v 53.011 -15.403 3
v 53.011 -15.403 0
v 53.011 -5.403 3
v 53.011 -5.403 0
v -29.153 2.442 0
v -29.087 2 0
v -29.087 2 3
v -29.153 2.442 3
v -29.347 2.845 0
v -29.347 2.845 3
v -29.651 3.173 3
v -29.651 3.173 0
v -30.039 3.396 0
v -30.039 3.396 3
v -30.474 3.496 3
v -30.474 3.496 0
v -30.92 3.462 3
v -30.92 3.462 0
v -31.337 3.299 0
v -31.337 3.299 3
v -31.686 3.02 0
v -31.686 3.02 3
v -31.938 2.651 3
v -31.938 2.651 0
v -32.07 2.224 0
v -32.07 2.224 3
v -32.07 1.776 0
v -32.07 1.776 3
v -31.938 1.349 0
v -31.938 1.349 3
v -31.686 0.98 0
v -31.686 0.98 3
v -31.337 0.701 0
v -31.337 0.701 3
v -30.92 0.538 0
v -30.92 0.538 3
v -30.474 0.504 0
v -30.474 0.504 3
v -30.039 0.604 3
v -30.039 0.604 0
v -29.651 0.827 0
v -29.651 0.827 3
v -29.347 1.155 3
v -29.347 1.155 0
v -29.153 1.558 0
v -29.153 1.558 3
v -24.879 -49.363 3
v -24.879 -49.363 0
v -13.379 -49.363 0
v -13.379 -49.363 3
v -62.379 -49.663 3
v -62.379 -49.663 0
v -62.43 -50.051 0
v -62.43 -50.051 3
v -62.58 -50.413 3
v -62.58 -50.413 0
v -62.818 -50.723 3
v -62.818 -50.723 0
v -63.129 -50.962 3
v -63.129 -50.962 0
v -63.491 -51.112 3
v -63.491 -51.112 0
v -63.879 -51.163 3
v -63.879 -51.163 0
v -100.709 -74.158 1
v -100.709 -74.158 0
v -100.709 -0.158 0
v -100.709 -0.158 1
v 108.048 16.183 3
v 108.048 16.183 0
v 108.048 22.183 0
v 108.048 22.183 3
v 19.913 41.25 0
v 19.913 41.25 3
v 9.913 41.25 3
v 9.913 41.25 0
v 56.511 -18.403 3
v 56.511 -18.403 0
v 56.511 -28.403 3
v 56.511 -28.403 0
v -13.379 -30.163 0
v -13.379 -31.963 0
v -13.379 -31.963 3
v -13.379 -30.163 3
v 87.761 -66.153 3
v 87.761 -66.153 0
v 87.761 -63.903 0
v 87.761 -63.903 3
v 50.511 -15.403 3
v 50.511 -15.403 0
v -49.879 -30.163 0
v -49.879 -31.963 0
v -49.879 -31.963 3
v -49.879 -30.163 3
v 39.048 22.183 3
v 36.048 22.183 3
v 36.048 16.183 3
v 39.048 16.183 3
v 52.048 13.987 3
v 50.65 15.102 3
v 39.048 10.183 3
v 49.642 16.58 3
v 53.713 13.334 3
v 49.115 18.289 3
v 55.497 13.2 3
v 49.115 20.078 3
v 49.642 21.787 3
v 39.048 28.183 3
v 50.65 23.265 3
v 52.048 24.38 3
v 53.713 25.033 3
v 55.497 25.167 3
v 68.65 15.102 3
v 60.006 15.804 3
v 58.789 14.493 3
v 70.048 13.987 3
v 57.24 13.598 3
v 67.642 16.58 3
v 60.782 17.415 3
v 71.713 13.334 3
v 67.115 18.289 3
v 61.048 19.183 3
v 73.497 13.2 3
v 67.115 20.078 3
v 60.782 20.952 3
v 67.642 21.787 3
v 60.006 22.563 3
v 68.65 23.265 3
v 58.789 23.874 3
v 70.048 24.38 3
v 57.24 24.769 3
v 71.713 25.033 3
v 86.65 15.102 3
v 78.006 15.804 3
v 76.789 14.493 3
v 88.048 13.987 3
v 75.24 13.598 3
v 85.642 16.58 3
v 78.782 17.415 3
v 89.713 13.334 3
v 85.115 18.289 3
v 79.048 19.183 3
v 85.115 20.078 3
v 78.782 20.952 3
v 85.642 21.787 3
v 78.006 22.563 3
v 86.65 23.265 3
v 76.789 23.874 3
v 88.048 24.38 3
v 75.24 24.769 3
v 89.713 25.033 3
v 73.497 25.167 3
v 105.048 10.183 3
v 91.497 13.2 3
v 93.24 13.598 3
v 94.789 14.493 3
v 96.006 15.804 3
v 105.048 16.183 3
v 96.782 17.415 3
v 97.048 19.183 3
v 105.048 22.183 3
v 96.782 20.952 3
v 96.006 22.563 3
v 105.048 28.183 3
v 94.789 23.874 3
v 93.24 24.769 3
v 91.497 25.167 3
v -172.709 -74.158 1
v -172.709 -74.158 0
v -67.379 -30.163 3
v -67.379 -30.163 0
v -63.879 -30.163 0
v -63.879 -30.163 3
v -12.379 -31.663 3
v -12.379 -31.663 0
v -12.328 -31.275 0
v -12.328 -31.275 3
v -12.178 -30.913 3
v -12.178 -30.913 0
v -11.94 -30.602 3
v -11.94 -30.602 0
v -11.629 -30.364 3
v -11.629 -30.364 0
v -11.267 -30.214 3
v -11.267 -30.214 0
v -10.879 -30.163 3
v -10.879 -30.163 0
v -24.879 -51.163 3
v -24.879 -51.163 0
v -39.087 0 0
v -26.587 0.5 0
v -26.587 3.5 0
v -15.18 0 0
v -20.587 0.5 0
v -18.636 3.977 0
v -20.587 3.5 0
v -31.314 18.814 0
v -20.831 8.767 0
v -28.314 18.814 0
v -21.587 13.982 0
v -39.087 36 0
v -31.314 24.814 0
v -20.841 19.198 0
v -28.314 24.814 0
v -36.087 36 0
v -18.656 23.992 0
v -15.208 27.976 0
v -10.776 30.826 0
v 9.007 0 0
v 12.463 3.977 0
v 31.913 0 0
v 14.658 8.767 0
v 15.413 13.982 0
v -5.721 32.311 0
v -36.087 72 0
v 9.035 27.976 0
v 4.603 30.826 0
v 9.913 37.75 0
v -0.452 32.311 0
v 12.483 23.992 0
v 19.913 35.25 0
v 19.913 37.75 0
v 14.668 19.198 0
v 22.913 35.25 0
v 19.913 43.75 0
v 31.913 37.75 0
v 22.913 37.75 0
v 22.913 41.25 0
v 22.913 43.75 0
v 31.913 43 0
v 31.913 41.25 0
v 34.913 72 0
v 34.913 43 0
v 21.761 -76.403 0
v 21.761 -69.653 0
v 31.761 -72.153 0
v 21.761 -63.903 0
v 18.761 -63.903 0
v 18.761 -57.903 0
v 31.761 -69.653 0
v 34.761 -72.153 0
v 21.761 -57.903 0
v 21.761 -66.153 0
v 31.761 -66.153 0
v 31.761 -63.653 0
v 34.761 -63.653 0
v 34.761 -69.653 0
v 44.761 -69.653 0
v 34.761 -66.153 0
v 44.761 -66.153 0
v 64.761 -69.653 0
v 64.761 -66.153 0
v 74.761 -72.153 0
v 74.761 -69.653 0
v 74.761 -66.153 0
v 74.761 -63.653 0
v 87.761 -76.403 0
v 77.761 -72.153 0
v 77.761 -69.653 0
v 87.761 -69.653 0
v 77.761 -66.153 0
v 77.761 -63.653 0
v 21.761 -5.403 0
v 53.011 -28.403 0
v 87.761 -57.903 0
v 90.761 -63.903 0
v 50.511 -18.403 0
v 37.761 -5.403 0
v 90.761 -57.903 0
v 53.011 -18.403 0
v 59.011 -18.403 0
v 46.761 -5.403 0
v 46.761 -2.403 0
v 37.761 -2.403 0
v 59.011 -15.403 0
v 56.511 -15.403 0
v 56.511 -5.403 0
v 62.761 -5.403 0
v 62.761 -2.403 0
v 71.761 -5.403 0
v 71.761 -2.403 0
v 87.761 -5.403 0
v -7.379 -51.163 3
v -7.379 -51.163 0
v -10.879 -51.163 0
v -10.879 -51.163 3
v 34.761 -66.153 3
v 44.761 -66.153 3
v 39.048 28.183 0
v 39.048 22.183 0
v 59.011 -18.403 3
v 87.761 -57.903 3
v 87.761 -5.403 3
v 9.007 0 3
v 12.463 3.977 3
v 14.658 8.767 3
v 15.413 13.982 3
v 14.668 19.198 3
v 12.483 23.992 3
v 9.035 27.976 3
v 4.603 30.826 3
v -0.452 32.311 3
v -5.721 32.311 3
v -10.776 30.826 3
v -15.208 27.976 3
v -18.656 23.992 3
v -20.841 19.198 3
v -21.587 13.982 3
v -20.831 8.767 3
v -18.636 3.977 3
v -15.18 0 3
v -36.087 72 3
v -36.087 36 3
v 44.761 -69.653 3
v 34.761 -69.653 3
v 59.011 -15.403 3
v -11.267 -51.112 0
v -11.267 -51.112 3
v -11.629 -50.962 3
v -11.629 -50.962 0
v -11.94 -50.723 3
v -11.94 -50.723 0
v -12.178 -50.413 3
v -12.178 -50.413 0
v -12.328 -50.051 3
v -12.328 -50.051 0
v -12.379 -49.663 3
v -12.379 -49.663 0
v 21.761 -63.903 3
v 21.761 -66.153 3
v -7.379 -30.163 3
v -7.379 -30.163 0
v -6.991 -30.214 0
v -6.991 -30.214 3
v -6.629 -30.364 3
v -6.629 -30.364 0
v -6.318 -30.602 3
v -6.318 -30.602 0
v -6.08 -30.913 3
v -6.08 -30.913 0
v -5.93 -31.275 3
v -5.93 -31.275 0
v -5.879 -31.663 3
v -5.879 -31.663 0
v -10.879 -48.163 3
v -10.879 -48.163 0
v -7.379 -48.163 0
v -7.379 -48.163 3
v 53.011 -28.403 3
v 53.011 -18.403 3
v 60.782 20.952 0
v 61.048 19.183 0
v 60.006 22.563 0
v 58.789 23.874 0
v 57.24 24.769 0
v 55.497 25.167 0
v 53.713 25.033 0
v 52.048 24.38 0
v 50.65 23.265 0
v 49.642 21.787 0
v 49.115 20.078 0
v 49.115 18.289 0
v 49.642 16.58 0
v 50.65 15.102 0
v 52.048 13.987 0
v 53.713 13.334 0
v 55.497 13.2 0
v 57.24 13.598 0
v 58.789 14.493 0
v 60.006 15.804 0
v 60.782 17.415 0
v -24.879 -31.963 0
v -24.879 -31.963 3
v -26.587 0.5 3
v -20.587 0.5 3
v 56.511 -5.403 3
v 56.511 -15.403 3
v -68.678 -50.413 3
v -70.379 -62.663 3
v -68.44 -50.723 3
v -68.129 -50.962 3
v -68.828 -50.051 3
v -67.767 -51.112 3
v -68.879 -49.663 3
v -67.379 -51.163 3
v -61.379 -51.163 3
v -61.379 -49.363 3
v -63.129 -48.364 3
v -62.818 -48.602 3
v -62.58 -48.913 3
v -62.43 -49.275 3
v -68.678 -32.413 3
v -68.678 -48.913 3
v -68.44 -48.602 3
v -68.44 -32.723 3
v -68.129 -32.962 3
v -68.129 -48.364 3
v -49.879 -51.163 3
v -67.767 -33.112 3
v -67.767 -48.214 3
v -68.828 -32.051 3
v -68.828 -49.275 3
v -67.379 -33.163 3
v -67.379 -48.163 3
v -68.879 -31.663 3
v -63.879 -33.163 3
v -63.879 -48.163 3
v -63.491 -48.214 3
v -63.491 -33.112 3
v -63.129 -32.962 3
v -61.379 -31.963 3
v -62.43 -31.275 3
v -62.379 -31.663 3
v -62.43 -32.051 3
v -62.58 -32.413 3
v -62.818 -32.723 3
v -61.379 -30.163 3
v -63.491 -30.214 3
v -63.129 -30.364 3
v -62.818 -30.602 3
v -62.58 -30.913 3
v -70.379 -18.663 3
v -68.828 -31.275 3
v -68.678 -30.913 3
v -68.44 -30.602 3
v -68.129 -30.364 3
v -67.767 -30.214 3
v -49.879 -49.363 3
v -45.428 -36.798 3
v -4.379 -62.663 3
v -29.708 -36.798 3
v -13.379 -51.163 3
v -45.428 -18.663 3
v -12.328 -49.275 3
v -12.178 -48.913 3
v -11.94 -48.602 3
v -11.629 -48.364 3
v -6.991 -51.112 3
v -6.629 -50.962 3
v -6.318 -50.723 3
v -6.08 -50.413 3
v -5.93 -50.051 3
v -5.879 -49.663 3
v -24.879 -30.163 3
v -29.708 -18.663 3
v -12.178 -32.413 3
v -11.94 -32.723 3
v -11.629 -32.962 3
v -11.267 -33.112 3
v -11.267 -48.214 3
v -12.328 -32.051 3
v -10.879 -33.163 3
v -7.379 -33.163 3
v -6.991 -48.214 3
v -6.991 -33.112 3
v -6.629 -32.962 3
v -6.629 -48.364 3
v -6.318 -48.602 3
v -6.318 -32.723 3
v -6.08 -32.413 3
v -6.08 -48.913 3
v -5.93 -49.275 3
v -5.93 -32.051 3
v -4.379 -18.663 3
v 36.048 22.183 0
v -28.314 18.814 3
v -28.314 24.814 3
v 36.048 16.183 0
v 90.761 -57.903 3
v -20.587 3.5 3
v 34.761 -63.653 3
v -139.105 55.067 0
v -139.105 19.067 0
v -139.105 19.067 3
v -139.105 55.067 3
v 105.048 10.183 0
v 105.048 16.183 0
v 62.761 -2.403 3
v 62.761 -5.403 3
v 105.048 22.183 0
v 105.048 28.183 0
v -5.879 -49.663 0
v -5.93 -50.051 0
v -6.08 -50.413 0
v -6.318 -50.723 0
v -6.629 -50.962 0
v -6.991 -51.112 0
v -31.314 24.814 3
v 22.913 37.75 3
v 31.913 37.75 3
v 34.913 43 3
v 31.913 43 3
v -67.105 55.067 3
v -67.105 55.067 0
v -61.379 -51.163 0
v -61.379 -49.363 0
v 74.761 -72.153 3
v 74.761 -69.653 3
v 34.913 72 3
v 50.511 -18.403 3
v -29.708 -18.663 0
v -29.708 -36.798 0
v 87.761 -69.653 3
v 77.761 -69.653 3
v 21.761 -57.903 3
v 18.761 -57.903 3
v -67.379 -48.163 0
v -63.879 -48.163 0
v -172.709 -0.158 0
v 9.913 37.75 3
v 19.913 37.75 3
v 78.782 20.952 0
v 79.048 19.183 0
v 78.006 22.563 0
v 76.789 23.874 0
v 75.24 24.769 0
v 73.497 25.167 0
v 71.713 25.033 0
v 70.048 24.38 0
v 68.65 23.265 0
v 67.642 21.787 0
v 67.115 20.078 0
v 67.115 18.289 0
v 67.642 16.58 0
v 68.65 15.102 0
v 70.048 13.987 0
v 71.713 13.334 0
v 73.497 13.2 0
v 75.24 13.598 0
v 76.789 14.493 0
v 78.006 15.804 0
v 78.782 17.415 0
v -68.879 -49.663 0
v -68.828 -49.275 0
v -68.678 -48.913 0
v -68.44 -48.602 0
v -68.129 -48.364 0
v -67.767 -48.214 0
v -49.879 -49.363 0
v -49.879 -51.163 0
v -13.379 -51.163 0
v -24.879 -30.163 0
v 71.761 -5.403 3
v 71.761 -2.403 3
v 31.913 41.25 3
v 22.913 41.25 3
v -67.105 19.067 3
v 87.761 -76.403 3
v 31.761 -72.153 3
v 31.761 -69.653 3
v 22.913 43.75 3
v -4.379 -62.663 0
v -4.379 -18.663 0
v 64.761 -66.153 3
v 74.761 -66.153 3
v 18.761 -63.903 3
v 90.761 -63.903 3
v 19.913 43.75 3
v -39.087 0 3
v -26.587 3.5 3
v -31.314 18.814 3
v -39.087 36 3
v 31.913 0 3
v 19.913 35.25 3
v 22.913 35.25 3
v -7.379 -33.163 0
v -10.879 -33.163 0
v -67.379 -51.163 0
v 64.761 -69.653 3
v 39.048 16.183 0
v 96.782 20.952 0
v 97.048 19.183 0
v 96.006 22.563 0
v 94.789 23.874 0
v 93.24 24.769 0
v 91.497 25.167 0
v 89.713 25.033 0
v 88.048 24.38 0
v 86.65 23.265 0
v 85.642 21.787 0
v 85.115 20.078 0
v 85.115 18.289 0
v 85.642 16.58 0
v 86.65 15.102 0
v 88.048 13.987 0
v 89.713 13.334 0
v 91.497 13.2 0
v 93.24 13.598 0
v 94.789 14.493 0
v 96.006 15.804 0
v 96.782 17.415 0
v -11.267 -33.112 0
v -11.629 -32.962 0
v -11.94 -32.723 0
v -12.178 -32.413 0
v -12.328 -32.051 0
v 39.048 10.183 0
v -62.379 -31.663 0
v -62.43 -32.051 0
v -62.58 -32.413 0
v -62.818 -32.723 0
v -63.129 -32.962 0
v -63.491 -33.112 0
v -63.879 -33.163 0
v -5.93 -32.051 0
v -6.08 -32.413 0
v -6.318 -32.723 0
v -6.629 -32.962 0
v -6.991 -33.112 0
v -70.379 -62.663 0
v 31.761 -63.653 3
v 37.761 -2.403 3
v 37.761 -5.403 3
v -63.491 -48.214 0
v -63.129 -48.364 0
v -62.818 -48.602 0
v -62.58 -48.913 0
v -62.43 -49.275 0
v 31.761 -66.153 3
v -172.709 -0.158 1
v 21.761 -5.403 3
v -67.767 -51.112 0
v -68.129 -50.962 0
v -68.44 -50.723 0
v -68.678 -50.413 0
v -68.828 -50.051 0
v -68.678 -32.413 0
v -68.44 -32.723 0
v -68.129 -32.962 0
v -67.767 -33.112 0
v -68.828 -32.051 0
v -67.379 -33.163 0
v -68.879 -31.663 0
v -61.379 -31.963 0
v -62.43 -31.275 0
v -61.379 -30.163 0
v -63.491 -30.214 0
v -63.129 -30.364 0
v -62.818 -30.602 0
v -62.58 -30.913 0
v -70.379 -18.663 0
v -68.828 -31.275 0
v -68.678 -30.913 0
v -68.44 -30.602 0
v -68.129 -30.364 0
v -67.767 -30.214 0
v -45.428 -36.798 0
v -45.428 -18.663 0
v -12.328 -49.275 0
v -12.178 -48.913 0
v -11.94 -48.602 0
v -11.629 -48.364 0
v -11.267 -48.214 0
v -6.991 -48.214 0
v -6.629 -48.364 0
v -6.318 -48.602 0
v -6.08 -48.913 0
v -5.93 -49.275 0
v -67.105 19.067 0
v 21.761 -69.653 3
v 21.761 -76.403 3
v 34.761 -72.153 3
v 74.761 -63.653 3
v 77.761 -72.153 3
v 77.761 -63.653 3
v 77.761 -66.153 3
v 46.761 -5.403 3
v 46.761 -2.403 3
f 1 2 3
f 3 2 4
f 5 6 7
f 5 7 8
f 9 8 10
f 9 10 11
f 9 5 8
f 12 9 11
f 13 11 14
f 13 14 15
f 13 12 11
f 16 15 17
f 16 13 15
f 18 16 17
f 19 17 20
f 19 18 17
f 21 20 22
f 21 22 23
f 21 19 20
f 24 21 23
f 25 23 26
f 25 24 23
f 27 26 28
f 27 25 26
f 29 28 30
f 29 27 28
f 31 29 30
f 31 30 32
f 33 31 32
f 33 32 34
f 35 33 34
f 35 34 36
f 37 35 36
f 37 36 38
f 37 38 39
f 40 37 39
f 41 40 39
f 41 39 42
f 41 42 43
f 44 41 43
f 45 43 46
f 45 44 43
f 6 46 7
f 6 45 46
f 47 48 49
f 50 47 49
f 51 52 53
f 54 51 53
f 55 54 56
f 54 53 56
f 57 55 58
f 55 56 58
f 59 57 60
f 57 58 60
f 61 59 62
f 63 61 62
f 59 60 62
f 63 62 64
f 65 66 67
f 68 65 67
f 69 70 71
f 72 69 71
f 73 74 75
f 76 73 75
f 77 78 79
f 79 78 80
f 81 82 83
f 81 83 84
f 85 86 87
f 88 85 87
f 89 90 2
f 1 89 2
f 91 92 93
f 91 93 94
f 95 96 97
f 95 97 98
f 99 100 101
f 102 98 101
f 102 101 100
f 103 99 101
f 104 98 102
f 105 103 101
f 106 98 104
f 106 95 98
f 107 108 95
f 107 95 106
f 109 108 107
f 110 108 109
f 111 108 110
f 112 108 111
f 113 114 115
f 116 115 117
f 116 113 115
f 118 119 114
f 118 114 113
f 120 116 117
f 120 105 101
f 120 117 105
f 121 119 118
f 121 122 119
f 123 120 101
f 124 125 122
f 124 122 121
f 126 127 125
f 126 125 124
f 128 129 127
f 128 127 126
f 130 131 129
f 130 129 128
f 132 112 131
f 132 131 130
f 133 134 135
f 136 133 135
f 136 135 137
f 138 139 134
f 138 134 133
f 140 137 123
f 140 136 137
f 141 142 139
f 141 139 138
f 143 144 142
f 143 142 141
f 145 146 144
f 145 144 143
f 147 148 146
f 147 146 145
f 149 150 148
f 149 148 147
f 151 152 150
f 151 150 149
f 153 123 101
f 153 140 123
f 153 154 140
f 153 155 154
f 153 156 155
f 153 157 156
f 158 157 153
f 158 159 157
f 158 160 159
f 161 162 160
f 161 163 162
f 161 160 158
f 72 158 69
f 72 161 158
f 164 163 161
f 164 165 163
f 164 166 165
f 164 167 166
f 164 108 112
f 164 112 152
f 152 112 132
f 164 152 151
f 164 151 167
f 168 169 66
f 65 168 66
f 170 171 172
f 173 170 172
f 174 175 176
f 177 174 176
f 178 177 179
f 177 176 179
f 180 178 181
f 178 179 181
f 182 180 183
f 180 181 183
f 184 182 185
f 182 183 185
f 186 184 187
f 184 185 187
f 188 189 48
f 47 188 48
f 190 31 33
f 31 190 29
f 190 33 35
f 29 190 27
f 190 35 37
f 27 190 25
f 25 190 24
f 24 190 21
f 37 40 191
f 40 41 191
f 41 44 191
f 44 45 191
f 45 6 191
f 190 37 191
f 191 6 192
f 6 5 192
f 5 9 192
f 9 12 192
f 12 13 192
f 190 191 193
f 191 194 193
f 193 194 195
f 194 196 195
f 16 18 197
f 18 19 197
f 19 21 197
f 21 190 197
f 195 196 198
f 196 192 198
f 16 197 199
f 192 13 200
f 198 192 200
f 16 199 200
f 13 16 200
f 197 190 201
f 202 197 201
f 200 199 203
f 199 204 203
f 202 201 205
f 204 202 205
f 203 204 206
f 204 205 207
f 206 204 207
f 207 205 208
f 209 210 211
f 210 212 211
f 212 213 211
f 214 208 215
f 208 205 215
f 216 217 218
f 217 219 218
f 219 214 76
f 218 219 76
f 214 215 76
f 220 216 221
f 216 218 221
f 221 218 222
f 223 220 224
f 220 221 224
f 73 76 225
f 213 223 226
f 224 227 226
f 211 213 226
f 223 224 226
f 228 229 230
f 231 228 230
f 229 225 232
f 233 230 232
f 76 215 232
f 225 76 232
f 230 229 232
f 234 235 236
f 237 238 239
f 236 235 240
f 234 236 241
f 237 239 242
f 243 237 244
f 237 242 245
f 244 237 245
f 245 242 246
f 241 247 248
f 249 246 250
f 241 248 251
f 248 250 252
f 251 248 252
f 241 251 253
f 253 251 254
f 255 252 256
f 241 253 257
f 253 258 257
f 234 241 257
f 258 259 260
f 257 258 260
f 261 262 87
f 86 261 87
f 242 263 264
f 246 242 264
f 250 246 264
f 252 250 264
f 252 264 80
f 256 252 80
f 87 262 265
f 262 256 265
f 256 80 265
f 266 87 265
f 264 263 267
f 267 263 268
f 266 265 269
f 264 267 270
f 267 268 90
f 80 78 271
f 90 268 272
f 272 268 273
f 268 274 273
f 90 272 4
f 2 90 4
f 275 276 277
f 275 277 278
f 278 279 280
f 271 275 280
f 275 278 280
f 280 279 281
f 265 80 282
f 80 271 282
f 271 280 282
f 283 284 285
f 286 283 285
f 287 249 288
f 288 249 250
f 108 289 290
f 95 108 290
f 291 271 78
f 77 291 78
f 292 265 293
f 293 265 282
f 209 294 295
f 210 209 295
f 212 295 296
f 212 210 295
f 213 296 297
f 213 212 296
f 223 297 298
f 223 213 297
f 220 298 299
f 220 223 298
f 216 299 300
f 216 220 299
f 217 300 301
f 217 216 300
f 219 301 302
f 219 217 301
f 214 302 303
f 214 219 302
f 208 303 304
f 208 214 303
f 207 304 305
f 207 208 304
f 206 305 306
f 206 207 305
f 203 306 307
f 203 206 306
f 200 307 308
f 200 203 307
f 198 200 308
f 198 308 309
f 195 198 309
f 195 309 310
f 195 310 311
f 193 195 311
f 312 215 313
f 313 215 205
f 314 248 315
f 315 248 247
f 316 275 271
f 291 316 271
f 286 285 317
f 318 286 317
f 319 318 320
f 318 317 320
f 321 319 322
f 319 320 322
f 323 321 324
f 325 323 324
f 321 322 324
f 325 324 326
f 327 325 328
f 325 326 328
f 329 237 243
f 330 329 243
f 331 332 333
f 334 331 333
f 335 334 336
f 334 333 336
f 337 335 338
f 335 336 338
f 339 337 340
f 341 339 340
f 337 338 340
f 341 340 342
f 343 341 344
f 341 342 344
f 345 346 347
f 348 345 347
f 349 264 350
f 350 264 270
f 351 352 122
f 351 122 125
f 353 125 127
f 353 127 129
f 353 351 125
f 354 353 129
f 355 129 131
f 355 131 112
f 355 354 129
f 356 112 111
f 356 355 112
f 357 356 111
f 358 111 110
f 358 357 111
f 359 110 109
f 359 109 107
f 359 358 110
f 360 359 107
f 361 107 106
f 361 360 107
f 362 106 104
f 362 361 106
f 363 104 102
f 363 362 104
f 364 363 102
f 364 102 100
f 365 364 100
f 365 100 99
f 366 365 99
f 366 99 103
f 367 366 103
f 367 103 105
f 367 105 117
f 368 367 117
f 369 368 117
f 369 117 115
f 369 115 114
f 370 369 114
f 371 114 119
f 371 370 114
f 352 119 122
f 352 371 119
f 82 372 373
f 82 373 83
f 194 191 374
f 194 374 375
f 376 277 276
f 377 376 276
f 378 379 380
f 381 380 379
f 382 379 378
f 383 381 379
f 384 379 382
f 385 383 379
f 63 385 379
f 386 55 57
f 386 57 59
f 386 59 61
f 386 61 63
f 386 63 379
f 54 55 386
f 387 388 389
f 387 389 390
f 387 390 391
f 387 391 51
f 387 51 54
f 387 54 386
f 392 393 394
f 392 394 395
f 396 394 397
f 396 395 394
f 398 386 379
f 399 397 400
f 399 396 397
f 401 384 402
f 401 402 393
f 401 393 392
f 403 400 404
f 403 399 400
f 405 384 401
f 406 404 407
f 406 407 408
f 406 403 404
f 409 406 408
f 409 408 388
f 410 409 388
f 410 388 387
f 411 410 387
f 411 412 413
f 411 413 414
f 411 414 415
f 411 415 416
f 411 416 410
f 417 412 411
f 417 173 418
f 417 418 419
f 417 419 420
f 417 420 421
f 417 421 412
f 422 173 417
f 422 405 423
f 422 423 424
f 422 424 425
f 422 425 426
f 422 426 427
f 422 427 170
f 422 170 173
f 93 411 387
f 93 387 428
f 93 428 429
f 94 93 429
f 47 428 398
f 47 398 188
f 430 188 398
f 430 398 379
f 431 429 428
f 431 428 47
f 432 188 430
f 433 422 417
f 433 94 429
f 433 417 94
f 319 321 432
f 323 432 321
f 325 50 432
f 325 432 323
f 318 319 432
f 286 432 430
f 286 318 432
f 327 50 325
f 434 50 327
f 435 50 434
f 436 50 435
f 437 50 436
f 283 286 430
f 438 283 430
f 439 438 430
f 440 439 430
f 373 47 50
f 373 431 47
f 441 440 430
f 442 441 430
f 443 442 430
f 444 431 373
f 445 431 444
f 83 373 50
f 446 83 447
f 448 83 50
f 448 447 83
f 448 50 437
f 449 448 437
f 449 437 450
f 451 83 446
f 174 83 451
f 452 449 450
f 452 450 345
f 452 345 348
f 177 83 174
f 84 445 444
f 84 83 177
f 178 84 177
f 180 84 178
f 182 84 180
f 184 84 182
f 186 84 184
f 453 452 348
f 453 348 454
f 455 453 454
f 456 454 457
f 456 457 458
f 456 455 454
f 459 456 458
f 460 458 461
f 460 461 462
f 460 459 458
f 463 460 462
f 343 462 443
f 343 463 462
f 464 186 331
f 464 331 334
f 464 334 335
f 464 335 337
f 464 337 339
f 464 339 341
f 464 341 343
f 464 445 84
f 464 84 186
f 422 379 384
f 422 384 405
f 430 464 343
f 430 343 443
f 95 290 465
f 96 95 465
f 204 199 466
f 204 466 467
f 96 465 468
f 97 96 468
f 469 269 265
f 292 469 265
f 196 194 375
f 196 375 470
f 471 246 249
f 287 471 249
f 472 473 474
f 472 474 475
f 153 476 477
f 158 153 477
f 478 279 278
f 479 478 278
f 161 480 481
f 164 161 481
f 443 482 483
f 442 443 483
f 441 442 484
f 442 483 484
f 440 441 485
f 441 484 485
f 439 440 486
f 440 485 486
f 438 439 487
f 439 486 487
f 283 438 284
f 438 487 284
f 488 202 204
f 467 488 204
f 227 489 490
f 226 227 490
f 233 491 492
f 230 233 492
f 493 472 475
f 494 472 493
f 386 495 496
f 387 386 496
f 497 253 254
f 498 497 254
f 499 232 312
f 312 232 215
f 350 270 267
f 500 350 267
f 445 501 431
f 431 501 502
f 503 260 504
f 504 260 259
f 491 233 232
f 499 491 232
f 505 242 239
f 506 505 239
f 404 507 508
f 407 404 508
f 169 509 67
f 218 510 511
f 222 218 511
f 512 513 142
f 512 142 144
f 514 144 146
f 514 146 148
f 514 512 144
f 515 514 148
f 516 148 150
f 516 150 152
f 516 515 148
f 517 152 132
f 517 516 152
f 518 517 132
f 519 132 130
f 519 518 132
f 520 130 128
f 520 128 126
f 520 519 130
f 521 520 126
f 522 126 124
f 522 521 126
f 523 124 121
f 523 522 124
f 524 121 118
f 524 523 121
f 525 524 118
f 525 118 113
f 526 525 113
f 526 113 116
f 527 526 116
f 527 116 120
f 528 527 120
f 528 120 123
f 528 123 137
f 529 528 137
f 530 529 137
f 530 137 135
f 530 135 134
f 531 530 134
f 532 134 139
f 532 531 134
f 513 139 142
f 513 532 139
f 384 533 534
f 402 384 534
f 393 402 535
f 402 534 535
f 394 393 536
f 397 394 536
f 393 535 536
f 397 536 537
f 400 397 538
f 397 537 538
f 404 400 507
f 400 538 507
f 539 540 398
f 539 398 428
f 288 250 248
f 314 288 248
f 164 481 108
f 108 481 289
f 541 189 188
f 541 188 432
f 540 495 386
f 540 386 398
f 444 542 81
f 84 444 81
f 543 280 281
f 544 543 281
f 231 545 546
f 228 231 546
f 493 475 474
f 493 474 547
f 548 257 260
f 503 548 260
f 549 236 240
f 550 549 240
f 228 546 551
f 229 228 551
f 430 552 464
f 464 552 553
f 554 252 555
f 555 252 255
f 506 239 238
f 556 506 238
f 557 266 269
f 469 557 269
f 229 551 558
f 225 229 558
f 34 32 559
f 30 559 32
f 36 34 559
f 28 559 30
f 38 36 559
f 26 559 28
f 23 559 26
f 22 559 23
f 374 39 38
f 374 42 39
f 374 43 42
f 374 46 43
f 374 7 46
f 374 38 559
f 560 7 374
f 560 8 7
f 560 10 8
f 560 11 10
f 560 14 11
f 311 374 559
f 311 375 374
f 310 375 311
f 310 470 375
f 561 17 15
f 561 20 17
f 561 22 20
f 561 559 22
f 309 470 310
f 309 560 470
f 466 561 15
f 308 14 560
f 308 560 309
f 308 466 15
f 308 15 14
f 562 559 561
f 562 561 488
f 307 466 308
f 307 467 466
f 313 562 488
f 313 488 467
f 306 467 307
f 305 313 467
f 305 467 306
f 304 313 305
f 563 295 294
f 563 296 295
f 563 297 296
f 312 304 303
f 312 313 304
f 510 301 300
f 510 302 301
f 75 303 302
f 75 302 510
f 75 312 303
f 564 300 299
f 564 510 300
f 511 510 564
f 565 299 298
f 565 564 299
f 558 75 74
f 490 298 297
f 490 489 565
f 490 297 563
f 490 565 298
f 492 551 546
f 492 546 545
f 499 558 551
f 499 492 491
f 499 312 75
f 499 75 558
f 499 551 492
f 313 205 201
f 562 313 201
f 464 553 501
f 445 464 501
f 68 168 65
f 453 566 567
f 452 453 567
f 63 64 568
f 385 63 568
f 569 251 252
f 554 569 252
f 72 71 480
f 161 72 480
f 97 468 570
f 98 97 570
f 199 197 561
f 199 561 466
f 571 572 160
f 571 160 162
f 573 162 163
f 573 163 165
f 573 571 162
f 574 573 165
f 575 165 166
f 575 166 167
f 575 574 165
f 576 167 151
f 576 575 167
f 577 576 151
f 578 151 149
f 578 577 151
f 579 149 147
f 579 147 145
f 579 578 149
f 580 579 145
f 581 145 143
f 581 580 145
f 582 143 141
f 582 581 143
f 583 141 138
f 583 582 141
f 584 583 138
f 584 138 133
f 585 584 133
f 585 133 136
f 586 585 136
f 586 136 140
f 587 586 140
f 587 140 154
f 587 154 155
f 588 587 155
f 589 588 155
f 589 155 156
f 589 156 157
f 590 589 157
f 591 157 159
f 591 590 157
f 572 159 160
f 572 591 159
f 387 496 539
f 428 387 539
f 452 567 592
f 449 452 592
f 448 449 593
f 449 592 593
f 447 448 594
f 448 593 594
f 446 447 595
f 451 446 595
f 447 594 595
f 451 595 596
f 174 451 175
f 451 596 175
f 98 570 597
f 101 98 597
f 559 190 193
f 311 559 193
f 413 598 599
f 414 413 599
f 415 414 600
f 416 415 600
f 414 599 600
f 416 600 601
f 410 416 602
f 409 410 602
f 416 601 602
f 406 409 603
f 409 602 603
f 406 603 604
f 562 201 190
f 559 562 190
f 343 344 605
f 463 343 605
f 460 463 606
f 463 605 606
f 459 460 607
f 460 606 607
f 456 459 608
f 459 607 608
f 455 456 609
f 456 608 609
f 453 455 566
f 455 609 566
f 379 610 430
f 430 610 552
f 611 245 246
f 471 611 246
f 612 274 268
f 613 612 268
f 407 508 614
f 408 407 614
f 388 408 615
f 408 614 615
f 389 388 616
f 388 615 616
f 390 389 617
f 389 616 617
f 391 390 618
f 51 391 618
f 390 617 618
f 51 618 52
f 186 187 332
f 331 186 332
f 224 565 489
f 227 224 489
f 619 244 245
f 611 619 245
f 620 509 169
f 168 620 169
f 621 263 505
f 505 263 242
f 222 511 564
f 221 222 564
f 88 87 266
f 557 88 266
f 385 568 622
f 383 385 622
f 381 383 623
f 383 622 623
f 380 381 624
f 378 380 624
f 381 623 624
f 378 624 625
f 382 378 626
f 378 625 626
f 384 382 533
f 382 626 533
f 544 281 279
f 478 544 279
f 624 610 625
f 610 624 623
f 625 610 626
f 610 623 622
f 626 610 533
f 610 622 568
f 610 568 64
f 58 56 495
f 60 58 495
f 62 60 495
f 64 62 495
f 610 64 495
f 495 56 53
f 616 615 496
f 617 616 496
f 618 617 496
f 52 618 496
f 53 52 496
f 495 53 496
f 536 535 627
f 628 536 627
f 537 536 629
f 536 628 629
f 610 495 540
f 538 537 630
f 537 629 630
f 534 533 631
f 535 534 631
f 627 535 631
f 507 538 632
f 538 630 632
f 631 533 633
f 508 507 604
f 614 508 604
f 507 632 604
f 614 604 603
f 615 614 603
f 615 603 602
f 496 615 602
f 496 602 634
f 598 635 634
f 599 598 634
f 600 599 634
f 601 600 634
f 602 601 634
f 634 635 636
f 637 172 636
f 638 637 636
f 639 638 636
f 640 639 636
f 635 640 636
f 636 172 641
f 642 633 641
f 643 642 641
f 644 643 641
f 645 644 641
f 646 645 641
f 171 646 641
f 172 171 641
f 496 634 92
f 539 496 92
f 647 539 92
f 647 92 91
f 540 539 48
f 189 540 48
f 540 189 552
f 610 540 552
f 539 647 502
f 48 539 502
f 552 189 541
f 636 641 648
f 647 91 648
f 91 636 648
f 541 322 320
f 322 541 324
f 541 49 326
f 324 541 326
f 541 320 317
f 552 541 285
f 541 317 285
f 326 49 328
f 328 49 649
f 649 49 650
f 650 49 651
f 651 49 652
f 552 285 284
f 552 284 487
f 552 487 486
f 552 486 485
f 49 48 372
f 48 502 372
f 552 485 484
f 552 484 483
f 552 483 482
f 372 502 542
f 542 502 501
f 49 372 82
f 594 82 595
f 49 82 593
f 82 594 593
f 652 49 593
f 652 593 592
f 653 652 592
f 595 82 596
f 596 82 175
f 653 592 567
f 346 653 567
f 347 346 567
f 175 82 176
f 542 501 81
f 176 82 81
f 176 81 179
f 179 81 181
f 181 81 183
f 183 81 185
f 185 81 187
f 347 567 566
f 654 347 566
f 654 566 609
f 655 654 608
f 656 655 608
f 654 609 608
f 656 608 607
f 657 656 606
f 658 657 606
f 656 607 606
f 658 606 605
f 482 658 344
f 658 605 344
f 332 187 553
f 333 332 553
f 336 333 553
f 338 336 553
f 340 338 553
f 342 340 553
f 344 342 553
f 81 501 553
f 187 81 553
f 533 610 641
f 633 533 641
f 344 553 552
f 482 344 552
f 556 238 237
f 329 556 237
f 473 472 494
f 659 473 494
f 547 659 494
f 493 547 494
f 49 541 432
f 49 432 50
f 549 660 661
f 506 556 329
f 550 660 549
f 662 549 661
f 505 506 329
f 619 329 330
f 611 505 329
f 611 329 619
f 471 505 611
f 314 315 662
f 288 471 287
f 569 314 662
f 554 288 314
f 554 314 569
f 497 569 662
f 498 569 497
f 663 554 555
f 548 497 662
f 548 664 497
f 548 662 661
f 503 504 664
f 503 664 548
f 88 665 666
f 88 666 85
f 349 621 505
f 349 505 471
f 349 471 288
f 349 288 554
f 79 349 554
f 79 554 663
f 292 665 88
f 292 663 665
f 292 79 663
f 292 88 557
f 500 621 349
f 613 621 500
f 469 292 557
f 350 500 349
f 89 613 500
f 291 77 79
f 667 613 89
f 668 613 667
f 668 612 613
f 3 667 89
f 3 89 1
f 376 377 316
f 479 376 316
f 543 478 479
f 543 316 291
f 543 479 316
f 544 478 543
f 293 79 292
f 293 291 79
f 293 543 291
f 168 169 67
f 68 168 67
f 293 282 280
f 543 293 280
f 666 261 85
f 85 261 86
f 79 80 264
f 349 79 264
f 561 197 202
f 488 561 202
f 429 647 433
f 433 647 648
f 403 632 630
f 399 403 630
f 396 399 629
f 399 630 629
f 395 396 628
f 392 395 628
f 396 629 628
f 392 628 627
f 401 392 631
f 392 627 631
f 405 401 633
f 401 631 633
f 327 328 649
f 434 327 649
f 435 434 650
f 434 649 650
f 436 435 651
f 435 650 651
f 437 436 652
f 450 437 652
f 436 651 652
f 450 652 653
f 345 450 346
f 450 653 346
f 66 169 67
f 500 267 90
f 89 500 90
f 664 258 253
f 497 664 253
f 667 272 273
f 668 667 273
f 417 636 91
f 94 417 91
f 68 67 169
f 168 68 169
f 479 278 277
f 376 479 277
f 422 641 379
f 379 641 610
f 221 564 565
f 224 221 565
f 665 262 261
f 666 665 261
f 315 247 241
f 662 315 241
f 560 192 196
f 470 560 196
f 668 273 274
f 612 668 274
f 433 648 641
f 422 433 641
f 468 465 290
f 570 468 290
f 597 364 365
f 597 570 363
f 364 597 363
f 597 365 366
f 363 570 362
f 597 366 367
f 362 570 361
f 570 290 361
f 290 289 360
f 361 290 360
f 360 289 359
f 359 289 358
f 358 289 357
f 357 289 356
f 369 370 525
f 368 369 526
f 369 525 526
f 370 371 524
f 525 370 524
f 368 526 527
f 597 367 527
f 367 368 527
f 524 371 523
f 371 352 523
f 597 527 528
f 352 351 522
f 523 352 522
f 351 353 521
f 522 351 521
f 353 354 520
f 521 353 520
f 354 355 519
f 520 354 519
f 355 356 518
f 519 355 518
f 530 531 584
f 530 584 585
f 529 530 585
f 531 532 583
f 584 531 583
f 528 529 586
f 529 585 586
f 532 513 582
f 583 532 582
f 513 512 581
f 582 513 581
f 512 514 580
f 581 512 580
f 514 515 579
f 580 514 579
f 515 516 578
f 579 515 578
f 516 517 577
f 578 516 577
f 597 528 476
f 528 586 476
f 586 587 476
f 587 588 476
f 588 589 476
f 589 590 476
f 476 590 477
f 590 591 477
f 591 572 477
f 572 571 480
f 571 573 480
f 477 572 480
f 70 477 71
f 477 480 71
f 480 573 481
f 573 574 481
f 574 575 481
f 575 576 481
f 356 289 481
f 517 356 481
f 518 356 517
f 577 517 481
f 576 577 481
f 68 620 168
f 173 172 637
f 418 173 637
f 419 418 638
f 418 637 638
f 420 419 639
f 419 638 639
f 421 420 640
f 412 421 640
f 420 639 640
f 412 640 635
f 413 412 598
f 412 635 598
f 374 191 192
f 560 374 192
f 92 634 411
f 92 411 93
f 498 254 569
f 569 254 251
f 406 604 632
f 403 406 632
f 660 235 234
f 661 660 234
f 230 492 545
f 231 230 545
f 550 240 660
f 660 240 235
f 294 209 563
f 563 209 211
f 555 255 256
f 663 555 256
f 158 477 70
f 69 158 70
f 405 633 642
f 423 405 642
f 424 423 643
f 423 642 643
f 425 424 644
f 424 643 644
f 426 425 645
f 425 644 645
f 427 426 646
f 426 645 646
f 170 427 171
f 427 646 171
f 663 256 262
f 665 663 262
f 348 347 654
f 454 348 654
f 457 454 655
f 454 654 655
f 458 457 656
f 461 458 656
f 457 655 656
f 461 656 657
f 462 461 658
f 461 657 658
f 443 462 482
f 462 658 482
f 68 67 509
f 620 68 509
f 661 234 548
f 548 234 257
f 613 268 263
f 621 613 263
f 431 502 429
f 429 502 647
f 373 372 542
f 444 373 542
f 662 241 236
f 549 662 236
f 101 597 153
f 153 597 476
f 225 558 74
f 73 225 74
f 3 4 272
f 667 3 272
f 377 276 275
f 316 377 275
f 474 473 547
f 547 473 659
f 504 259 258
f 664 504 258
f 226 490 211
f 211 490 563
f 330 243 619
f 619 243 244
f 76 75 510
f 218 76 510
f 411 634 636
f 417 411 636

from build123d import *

# Parameters (mm, degrees)
F1_DEPTH  = 3
F2_R      = 18.5
F2_R_2    = 1.5
F2_W      = 6
F2_H      = 3
F2_W_2    = 3
F2_H_2    = 6
F3_DEPTH  = 3
F5_DEPTH  = 3
F6_W      = 11.5
F6_H      = 1.8
F7_DEPTH  = 3
F8_W      = 72
F8_H      = 36
F9_DEPTH  = 3
F11_DEPTH = 3
F13_DEPTH = 1
F14_DEPTH = 1
F15_R     = 6
F16_DEPTH = 3


# Not quite as in the source:
# - a feature names something its author has since deleted; it is built from what else it names


with BuildPart() as f1:
    # F0 (on Top) → F1 (new body)
    with BuildSketch(Plane.XY):
        Polygon((-39.0865747744, 0), (0, 0), (31.9134252256, 0), (31.9134252256, 36), (34.9134252256, 36), (34.9134252256, 72), (-36.0865747744, 72), (-36.0865747744, 36), (-39.0865747744, 36), align=None)
    extrude(amount=F1_DEPTH)

    # F2 (on face) → F3 (cut, through all)
    with BuildSketch(Plane.XY):
        with Locations((-3.0865747744, 14)):
            Circle(F2_R)
        with Locations((-30.5865747744, 2)):
            Circle(F2_R_2)
        with Locations((-23.5865747744, 2)):
            Rectangle(F2_W, F2_H)
        with Locations((-29.8141494989, 21.8136473298)):
            Rectangle(F2_W_2, F2_H_2)
    extrude(amount=F3_DEPTH, mode=Mode.SUBTRACT)

    # F4 (on face) → F5 (cut, through all)
    with BuildSketch(Plane.XY.offset(3)):
        Polygon((31.9134252256, 41.25), (22.9134252256, 41.25), (22.9134252256, 43.75), (19.9134252256, 43.75), (19.9134252256, 41.25), (9.9134252256, 41.25), (9.9134252256, 37.75), (19.9134252256, 37.75), (19.9134252256, 35.25), (22.9134252256, 35.25), (22.9134252256, 37.75), (31.9134252256, 37.75), (31.9134252256, 36), (34.9134252256, 36), (34.9134252256, 43), (31.9134252256, 43), align=None)
    extrude(amount=-F5_DEPTH, mode=Mode.SUBTRACT)


with BuildPart() as f7:
    # F6 (on Top) → F7 (new body)
    with BuildSketch(Plane.XY):
        Polygon((-45.4283840954, -18.6628243396), (-70.3789859414, -18.6628243396), (-70.3789859414, -62.6628243396), (-4.3789859414, -62.6628243396), (-4.3789859414, -18.6628243396), (-29.7082625329, -18.6628243396), (-29.7082625329, -36.7978513241), (-45.4283840954, -36.7978513241), align=None)
        with BuildLine():
            ThreePointArc((-63.8789859414, -48.1628243396), (-62.8183257696, -48.6021641678), (-62.3789859414, -49.6628243396))
            ThreePointArc((-62.3789859414, -49.6628243396), (-62.8183257696, -50.7234845114), (-63.8789859414, -51.1628243396))
            Line((-63.8789859414, -51.1628243396), (-67.3789859414, -51.1628243396))
            ThreePointArc((-67.3789859414, -51.1628243396), (-68.4396461132, -50.7234845114), (-68.8789859414, -49.6628243396))
            ThreePointArc((-68.8789859414, -49.6628243396), (-68.4396461132, -48.6021641678), (-67.3789859414, -48.1628243396))
            Line((-67.3789859414, -48.1628243396), (-63.8789859414, -48.1628243396))
        make_face(mode=Mode.SUBTRACT)
        with Locations((-55.6289859414, -50.2628243396)):
            Rectangle(F6_W, F6_H, mode=Mode.SUBTRACT)
        with Locations((-19.1289859414, -50.2628243396)):
            Rectangle(F6_W, F6_H, mode=Mode.SUBTRACT)
        with BuildLine():
            ThreePointArc((-5.8789859414, -49.6628243396), (-6.3183257696, -50.7234845114), (-7.3789859414, -51.1628243396))
            Line((-7.3789859414, -51.1628243396), (-10.8789859414, -51.1628243396))
            ThreePointArc((-10.8789859414, -51.1628243396), (-11.9396461132, -50.7234845114), (-12.3789859414, -49.6628243396))
            ThreePointArc((-12.3789859414, -49.6628243396), (-11.9396461132, -48.6021641678), (-10.8789859414, -48.1628243396))
            Line((-10.8789859414, -48.1628243396), (-7.3789859414, -48.1628243396))
            ThreePointArc((-7.3789859414, -48.1628243396), (-6.3183257696, -48.6021641678), (-5.8789859414, -49.6628243396))
        make_face(mode=Mode.SUBTRACT)
        with BuildLine():
            ThreePointArc((-68.8789859414, -31.6628243396), (-68.4396461132, -30.6021641678), (-67.3789859414, -30.1628243396))
            Line((-67.3789859414, -30.1628243396), (-63.8789859414, -30.1628243396))
            ThreePointArc((-63.8789859414, -30.1628243396), (-62.8183257696, -30.6021641678), (-62.3789859414, -31.6628243396))
            ThreePointArc((-62.3789859414, -31.6628243396), (-62.8183257696, -32.7234845114), (-63.8789859414, -33.1628243396))
            Line((-63.8789859414, -33.1628243396), (-67.3789859414, -33.1628243396))
            ThreePointArc((-67.3789859414, -33.1628243396), (-68.4396461132, -32.7234845114), (-68.8789859414, -31.6628243396))
        make_face(mode=Mode.SUBTRACT)
        with Locations((-55.6289859414, -31.0628243396)):
            Rectangle(F6_W, F6_H, mode=Mode.SUBTRACT)
        with Locations((-19.1289859414, -31.0628243396)):
            Rectangle(F6_W, F6_H, mode=Mode.SUBTRACT)
        with BuildLine():
            ThreePointArc((-10.8789859414, -33.1628243396), (-11.9396461132, -32.7234845114), (-12.3789859414, -31.6628243396))
            ThreePointArc((-12.3789859414, -31.6628243396), (-11.9396461132, -30.6021641678), (-10.8789859414, -30.1628243396))
            Line((-10.8789859414, -30.1628243396), (-7.3789859414, -30.1628243396))
            ThreePointArc((-7.3789859414, -30.1628243396), (-6.3183257696, -30.6021641678), (-5.8789859414, -31.6628243396))
            ThreePointArc((-5.8789859414, -31.6628243396), (-6.3183257696, -32.7234845114), (-7.3789859414, -33.1628243396))
            Line((-7.3789859414, -33.1628243396), (-10.8789859414, -33.1628243396))
        make_face(mode=Mode.SUBTRACT)
    extrude(amount=F7_DEPTH)


with BuildPart() as f9:
    # F8 (on Top) → F9 (new body)
    with BuildSketch(Plane.XY):
        with Locations((-103.1052859619, 37.0665201917)):
            Rectangle(F8_W, F8_H)
    extrude(amount=F9_DEPTH)


with BuildPart() as f11:
    # F10 (on Top) → F11 (new body)
    with BuildSketch(Plane.XY):
        Polygon((37.7613991201, -5.4026411064), (21.7613991201, -5.4026411064), (21.7613991201, -57.9026411064), (18.7613991201, -57.9026411064), (18.7613991201, -63.9026411064), (21.7613991201, -63.9026411064), (21.7613991201, -66.1526411064), (31.7613991201, -66.1526411064), (31.7613991201, -63.6526411064), (34.7613991201, -63.6526411064), (34.7613991201, -66.1526411064), (44.7613991201, -66.1526411064), (44.7613991201, -69.6526411064), (34.7613991201, -69.6526411064), (34.7613991201, -72.1526411064), (31.7613991201, -72.1526411064), (31.7613991201, -69.6526411064), (21.7613991201, -69.6526411064), (21.7613991201, -76.4026411064), (87.7613991201, -76.4026411064), (87.7613991201, -69.6526411064), (77.7613991201, -69.6526411064), (77.7613991201, -72.1526411064), (74.7613991201, -72.1526411064), (74.7613991201, -69.6526411064), (64.7613991201, -69.6526411064), (64.7613991201, -66.1526411064), (74.7613991201, -66.1526411064), (74.7613991201, -63.6526411064), (77.7613991201, -63.6526411064), (77.7613991201, -66.1526411064), (87.7613991201, -66.1526411064), (87.7613991201, -63.9026411064), (90.7613991201, -63.9026411064), (90.7613991201, -57.9026411064), (87.7613991201, -57.9026411064), (87.7613991201, -5.4026411064), (71.7613991201, -5.4026411064), (71.7613991201, -2.4026411064), (62.7613991201, -2.4026411064), (62.7613991201, -5.4026411064), (56.5113991201, -5.4026411064), (56.5113991201, -15.4026411064), (59.0113991201, -15.4026411064), (59.0113991201, -18.4026411064), (56.5113991201, -18.4026411064), (56.5113991201, -28.4026411064), (53.0113991201, -28.4026411064), (53.0113991201, -18.4026411064), (50.5113991201, -18.4026411064), (50.5113991201, -15.4026411064), (53.0113991201, -15.4026411064), (53.0113991201, -5.4026411064), (46.7613991201, -5.4026411064), (46.7613991201, -2.4026411064), (37.7613991201, -2.4026411064), align=None)
    extrude(amount=F11_DEPTH)


with BuildPart() as f13:
    # F12 (on Top) → F13 (new body)
    with BuildSketch(Plane.XY):
        Polygon((-100.7087475955, -0.1583366255), (-172.7087475955, -0.1583366255), (-172.7087475955, -74.1583366255), align=None)
    extrude(amount=F13_DEPTH)


with BuildPart() as f14:
    # F12 (on Top) → F14 (new body)
    with BuildSketch(Plane.XY):
        Polygon((-100.7087475955, -74.1583366255), (-100.7087475955, -0.1583366255), (-172.7087475955, -74.1583366255), align=None)
    extrude(amount=F14_DEPTH)


with BuildPart() as f16:
    # F15 (on Top) → F16 (new body)
    with BuildSketch(Plane.XY):
        Polygon((36.0482842449, 22.1834971545), (36.0482842449, 16.1834971545), (39.0482842449, 16.1834971545), (39.0482842449, 10.1834971545), (105.0482842449, 10.1834971545), (105.0482842449, 16.1834971545), (108.0482842449, 16.1834971545), (108.0482842449, 22.1834971545), (105.0482842449, 22.1834971545), (105.0482842449, 28.1834971545), (39.0482842449, 28.1834971545), (39.0482842449, 22.1834971545), align=None)
        with Locations((55.0482842449, 19.1834971545)):
            Circle(F15_R, mode=Mode.SUBTRACT)
        with Locations((73.0482842449, 19.1834971545)):
            Circle(F15_R, mode=Mode.SUBTRACT)
        with Locations((91.0482842449, 19.1834971545)):
            Circle(F15_R, mode=Mode.SUBTRACT)
    extrude(amount=F16_DEPTH)


solid = Compound([f1.part, f7.part, f9.part, f11.part, f13.part, f14.part, f16.part])
